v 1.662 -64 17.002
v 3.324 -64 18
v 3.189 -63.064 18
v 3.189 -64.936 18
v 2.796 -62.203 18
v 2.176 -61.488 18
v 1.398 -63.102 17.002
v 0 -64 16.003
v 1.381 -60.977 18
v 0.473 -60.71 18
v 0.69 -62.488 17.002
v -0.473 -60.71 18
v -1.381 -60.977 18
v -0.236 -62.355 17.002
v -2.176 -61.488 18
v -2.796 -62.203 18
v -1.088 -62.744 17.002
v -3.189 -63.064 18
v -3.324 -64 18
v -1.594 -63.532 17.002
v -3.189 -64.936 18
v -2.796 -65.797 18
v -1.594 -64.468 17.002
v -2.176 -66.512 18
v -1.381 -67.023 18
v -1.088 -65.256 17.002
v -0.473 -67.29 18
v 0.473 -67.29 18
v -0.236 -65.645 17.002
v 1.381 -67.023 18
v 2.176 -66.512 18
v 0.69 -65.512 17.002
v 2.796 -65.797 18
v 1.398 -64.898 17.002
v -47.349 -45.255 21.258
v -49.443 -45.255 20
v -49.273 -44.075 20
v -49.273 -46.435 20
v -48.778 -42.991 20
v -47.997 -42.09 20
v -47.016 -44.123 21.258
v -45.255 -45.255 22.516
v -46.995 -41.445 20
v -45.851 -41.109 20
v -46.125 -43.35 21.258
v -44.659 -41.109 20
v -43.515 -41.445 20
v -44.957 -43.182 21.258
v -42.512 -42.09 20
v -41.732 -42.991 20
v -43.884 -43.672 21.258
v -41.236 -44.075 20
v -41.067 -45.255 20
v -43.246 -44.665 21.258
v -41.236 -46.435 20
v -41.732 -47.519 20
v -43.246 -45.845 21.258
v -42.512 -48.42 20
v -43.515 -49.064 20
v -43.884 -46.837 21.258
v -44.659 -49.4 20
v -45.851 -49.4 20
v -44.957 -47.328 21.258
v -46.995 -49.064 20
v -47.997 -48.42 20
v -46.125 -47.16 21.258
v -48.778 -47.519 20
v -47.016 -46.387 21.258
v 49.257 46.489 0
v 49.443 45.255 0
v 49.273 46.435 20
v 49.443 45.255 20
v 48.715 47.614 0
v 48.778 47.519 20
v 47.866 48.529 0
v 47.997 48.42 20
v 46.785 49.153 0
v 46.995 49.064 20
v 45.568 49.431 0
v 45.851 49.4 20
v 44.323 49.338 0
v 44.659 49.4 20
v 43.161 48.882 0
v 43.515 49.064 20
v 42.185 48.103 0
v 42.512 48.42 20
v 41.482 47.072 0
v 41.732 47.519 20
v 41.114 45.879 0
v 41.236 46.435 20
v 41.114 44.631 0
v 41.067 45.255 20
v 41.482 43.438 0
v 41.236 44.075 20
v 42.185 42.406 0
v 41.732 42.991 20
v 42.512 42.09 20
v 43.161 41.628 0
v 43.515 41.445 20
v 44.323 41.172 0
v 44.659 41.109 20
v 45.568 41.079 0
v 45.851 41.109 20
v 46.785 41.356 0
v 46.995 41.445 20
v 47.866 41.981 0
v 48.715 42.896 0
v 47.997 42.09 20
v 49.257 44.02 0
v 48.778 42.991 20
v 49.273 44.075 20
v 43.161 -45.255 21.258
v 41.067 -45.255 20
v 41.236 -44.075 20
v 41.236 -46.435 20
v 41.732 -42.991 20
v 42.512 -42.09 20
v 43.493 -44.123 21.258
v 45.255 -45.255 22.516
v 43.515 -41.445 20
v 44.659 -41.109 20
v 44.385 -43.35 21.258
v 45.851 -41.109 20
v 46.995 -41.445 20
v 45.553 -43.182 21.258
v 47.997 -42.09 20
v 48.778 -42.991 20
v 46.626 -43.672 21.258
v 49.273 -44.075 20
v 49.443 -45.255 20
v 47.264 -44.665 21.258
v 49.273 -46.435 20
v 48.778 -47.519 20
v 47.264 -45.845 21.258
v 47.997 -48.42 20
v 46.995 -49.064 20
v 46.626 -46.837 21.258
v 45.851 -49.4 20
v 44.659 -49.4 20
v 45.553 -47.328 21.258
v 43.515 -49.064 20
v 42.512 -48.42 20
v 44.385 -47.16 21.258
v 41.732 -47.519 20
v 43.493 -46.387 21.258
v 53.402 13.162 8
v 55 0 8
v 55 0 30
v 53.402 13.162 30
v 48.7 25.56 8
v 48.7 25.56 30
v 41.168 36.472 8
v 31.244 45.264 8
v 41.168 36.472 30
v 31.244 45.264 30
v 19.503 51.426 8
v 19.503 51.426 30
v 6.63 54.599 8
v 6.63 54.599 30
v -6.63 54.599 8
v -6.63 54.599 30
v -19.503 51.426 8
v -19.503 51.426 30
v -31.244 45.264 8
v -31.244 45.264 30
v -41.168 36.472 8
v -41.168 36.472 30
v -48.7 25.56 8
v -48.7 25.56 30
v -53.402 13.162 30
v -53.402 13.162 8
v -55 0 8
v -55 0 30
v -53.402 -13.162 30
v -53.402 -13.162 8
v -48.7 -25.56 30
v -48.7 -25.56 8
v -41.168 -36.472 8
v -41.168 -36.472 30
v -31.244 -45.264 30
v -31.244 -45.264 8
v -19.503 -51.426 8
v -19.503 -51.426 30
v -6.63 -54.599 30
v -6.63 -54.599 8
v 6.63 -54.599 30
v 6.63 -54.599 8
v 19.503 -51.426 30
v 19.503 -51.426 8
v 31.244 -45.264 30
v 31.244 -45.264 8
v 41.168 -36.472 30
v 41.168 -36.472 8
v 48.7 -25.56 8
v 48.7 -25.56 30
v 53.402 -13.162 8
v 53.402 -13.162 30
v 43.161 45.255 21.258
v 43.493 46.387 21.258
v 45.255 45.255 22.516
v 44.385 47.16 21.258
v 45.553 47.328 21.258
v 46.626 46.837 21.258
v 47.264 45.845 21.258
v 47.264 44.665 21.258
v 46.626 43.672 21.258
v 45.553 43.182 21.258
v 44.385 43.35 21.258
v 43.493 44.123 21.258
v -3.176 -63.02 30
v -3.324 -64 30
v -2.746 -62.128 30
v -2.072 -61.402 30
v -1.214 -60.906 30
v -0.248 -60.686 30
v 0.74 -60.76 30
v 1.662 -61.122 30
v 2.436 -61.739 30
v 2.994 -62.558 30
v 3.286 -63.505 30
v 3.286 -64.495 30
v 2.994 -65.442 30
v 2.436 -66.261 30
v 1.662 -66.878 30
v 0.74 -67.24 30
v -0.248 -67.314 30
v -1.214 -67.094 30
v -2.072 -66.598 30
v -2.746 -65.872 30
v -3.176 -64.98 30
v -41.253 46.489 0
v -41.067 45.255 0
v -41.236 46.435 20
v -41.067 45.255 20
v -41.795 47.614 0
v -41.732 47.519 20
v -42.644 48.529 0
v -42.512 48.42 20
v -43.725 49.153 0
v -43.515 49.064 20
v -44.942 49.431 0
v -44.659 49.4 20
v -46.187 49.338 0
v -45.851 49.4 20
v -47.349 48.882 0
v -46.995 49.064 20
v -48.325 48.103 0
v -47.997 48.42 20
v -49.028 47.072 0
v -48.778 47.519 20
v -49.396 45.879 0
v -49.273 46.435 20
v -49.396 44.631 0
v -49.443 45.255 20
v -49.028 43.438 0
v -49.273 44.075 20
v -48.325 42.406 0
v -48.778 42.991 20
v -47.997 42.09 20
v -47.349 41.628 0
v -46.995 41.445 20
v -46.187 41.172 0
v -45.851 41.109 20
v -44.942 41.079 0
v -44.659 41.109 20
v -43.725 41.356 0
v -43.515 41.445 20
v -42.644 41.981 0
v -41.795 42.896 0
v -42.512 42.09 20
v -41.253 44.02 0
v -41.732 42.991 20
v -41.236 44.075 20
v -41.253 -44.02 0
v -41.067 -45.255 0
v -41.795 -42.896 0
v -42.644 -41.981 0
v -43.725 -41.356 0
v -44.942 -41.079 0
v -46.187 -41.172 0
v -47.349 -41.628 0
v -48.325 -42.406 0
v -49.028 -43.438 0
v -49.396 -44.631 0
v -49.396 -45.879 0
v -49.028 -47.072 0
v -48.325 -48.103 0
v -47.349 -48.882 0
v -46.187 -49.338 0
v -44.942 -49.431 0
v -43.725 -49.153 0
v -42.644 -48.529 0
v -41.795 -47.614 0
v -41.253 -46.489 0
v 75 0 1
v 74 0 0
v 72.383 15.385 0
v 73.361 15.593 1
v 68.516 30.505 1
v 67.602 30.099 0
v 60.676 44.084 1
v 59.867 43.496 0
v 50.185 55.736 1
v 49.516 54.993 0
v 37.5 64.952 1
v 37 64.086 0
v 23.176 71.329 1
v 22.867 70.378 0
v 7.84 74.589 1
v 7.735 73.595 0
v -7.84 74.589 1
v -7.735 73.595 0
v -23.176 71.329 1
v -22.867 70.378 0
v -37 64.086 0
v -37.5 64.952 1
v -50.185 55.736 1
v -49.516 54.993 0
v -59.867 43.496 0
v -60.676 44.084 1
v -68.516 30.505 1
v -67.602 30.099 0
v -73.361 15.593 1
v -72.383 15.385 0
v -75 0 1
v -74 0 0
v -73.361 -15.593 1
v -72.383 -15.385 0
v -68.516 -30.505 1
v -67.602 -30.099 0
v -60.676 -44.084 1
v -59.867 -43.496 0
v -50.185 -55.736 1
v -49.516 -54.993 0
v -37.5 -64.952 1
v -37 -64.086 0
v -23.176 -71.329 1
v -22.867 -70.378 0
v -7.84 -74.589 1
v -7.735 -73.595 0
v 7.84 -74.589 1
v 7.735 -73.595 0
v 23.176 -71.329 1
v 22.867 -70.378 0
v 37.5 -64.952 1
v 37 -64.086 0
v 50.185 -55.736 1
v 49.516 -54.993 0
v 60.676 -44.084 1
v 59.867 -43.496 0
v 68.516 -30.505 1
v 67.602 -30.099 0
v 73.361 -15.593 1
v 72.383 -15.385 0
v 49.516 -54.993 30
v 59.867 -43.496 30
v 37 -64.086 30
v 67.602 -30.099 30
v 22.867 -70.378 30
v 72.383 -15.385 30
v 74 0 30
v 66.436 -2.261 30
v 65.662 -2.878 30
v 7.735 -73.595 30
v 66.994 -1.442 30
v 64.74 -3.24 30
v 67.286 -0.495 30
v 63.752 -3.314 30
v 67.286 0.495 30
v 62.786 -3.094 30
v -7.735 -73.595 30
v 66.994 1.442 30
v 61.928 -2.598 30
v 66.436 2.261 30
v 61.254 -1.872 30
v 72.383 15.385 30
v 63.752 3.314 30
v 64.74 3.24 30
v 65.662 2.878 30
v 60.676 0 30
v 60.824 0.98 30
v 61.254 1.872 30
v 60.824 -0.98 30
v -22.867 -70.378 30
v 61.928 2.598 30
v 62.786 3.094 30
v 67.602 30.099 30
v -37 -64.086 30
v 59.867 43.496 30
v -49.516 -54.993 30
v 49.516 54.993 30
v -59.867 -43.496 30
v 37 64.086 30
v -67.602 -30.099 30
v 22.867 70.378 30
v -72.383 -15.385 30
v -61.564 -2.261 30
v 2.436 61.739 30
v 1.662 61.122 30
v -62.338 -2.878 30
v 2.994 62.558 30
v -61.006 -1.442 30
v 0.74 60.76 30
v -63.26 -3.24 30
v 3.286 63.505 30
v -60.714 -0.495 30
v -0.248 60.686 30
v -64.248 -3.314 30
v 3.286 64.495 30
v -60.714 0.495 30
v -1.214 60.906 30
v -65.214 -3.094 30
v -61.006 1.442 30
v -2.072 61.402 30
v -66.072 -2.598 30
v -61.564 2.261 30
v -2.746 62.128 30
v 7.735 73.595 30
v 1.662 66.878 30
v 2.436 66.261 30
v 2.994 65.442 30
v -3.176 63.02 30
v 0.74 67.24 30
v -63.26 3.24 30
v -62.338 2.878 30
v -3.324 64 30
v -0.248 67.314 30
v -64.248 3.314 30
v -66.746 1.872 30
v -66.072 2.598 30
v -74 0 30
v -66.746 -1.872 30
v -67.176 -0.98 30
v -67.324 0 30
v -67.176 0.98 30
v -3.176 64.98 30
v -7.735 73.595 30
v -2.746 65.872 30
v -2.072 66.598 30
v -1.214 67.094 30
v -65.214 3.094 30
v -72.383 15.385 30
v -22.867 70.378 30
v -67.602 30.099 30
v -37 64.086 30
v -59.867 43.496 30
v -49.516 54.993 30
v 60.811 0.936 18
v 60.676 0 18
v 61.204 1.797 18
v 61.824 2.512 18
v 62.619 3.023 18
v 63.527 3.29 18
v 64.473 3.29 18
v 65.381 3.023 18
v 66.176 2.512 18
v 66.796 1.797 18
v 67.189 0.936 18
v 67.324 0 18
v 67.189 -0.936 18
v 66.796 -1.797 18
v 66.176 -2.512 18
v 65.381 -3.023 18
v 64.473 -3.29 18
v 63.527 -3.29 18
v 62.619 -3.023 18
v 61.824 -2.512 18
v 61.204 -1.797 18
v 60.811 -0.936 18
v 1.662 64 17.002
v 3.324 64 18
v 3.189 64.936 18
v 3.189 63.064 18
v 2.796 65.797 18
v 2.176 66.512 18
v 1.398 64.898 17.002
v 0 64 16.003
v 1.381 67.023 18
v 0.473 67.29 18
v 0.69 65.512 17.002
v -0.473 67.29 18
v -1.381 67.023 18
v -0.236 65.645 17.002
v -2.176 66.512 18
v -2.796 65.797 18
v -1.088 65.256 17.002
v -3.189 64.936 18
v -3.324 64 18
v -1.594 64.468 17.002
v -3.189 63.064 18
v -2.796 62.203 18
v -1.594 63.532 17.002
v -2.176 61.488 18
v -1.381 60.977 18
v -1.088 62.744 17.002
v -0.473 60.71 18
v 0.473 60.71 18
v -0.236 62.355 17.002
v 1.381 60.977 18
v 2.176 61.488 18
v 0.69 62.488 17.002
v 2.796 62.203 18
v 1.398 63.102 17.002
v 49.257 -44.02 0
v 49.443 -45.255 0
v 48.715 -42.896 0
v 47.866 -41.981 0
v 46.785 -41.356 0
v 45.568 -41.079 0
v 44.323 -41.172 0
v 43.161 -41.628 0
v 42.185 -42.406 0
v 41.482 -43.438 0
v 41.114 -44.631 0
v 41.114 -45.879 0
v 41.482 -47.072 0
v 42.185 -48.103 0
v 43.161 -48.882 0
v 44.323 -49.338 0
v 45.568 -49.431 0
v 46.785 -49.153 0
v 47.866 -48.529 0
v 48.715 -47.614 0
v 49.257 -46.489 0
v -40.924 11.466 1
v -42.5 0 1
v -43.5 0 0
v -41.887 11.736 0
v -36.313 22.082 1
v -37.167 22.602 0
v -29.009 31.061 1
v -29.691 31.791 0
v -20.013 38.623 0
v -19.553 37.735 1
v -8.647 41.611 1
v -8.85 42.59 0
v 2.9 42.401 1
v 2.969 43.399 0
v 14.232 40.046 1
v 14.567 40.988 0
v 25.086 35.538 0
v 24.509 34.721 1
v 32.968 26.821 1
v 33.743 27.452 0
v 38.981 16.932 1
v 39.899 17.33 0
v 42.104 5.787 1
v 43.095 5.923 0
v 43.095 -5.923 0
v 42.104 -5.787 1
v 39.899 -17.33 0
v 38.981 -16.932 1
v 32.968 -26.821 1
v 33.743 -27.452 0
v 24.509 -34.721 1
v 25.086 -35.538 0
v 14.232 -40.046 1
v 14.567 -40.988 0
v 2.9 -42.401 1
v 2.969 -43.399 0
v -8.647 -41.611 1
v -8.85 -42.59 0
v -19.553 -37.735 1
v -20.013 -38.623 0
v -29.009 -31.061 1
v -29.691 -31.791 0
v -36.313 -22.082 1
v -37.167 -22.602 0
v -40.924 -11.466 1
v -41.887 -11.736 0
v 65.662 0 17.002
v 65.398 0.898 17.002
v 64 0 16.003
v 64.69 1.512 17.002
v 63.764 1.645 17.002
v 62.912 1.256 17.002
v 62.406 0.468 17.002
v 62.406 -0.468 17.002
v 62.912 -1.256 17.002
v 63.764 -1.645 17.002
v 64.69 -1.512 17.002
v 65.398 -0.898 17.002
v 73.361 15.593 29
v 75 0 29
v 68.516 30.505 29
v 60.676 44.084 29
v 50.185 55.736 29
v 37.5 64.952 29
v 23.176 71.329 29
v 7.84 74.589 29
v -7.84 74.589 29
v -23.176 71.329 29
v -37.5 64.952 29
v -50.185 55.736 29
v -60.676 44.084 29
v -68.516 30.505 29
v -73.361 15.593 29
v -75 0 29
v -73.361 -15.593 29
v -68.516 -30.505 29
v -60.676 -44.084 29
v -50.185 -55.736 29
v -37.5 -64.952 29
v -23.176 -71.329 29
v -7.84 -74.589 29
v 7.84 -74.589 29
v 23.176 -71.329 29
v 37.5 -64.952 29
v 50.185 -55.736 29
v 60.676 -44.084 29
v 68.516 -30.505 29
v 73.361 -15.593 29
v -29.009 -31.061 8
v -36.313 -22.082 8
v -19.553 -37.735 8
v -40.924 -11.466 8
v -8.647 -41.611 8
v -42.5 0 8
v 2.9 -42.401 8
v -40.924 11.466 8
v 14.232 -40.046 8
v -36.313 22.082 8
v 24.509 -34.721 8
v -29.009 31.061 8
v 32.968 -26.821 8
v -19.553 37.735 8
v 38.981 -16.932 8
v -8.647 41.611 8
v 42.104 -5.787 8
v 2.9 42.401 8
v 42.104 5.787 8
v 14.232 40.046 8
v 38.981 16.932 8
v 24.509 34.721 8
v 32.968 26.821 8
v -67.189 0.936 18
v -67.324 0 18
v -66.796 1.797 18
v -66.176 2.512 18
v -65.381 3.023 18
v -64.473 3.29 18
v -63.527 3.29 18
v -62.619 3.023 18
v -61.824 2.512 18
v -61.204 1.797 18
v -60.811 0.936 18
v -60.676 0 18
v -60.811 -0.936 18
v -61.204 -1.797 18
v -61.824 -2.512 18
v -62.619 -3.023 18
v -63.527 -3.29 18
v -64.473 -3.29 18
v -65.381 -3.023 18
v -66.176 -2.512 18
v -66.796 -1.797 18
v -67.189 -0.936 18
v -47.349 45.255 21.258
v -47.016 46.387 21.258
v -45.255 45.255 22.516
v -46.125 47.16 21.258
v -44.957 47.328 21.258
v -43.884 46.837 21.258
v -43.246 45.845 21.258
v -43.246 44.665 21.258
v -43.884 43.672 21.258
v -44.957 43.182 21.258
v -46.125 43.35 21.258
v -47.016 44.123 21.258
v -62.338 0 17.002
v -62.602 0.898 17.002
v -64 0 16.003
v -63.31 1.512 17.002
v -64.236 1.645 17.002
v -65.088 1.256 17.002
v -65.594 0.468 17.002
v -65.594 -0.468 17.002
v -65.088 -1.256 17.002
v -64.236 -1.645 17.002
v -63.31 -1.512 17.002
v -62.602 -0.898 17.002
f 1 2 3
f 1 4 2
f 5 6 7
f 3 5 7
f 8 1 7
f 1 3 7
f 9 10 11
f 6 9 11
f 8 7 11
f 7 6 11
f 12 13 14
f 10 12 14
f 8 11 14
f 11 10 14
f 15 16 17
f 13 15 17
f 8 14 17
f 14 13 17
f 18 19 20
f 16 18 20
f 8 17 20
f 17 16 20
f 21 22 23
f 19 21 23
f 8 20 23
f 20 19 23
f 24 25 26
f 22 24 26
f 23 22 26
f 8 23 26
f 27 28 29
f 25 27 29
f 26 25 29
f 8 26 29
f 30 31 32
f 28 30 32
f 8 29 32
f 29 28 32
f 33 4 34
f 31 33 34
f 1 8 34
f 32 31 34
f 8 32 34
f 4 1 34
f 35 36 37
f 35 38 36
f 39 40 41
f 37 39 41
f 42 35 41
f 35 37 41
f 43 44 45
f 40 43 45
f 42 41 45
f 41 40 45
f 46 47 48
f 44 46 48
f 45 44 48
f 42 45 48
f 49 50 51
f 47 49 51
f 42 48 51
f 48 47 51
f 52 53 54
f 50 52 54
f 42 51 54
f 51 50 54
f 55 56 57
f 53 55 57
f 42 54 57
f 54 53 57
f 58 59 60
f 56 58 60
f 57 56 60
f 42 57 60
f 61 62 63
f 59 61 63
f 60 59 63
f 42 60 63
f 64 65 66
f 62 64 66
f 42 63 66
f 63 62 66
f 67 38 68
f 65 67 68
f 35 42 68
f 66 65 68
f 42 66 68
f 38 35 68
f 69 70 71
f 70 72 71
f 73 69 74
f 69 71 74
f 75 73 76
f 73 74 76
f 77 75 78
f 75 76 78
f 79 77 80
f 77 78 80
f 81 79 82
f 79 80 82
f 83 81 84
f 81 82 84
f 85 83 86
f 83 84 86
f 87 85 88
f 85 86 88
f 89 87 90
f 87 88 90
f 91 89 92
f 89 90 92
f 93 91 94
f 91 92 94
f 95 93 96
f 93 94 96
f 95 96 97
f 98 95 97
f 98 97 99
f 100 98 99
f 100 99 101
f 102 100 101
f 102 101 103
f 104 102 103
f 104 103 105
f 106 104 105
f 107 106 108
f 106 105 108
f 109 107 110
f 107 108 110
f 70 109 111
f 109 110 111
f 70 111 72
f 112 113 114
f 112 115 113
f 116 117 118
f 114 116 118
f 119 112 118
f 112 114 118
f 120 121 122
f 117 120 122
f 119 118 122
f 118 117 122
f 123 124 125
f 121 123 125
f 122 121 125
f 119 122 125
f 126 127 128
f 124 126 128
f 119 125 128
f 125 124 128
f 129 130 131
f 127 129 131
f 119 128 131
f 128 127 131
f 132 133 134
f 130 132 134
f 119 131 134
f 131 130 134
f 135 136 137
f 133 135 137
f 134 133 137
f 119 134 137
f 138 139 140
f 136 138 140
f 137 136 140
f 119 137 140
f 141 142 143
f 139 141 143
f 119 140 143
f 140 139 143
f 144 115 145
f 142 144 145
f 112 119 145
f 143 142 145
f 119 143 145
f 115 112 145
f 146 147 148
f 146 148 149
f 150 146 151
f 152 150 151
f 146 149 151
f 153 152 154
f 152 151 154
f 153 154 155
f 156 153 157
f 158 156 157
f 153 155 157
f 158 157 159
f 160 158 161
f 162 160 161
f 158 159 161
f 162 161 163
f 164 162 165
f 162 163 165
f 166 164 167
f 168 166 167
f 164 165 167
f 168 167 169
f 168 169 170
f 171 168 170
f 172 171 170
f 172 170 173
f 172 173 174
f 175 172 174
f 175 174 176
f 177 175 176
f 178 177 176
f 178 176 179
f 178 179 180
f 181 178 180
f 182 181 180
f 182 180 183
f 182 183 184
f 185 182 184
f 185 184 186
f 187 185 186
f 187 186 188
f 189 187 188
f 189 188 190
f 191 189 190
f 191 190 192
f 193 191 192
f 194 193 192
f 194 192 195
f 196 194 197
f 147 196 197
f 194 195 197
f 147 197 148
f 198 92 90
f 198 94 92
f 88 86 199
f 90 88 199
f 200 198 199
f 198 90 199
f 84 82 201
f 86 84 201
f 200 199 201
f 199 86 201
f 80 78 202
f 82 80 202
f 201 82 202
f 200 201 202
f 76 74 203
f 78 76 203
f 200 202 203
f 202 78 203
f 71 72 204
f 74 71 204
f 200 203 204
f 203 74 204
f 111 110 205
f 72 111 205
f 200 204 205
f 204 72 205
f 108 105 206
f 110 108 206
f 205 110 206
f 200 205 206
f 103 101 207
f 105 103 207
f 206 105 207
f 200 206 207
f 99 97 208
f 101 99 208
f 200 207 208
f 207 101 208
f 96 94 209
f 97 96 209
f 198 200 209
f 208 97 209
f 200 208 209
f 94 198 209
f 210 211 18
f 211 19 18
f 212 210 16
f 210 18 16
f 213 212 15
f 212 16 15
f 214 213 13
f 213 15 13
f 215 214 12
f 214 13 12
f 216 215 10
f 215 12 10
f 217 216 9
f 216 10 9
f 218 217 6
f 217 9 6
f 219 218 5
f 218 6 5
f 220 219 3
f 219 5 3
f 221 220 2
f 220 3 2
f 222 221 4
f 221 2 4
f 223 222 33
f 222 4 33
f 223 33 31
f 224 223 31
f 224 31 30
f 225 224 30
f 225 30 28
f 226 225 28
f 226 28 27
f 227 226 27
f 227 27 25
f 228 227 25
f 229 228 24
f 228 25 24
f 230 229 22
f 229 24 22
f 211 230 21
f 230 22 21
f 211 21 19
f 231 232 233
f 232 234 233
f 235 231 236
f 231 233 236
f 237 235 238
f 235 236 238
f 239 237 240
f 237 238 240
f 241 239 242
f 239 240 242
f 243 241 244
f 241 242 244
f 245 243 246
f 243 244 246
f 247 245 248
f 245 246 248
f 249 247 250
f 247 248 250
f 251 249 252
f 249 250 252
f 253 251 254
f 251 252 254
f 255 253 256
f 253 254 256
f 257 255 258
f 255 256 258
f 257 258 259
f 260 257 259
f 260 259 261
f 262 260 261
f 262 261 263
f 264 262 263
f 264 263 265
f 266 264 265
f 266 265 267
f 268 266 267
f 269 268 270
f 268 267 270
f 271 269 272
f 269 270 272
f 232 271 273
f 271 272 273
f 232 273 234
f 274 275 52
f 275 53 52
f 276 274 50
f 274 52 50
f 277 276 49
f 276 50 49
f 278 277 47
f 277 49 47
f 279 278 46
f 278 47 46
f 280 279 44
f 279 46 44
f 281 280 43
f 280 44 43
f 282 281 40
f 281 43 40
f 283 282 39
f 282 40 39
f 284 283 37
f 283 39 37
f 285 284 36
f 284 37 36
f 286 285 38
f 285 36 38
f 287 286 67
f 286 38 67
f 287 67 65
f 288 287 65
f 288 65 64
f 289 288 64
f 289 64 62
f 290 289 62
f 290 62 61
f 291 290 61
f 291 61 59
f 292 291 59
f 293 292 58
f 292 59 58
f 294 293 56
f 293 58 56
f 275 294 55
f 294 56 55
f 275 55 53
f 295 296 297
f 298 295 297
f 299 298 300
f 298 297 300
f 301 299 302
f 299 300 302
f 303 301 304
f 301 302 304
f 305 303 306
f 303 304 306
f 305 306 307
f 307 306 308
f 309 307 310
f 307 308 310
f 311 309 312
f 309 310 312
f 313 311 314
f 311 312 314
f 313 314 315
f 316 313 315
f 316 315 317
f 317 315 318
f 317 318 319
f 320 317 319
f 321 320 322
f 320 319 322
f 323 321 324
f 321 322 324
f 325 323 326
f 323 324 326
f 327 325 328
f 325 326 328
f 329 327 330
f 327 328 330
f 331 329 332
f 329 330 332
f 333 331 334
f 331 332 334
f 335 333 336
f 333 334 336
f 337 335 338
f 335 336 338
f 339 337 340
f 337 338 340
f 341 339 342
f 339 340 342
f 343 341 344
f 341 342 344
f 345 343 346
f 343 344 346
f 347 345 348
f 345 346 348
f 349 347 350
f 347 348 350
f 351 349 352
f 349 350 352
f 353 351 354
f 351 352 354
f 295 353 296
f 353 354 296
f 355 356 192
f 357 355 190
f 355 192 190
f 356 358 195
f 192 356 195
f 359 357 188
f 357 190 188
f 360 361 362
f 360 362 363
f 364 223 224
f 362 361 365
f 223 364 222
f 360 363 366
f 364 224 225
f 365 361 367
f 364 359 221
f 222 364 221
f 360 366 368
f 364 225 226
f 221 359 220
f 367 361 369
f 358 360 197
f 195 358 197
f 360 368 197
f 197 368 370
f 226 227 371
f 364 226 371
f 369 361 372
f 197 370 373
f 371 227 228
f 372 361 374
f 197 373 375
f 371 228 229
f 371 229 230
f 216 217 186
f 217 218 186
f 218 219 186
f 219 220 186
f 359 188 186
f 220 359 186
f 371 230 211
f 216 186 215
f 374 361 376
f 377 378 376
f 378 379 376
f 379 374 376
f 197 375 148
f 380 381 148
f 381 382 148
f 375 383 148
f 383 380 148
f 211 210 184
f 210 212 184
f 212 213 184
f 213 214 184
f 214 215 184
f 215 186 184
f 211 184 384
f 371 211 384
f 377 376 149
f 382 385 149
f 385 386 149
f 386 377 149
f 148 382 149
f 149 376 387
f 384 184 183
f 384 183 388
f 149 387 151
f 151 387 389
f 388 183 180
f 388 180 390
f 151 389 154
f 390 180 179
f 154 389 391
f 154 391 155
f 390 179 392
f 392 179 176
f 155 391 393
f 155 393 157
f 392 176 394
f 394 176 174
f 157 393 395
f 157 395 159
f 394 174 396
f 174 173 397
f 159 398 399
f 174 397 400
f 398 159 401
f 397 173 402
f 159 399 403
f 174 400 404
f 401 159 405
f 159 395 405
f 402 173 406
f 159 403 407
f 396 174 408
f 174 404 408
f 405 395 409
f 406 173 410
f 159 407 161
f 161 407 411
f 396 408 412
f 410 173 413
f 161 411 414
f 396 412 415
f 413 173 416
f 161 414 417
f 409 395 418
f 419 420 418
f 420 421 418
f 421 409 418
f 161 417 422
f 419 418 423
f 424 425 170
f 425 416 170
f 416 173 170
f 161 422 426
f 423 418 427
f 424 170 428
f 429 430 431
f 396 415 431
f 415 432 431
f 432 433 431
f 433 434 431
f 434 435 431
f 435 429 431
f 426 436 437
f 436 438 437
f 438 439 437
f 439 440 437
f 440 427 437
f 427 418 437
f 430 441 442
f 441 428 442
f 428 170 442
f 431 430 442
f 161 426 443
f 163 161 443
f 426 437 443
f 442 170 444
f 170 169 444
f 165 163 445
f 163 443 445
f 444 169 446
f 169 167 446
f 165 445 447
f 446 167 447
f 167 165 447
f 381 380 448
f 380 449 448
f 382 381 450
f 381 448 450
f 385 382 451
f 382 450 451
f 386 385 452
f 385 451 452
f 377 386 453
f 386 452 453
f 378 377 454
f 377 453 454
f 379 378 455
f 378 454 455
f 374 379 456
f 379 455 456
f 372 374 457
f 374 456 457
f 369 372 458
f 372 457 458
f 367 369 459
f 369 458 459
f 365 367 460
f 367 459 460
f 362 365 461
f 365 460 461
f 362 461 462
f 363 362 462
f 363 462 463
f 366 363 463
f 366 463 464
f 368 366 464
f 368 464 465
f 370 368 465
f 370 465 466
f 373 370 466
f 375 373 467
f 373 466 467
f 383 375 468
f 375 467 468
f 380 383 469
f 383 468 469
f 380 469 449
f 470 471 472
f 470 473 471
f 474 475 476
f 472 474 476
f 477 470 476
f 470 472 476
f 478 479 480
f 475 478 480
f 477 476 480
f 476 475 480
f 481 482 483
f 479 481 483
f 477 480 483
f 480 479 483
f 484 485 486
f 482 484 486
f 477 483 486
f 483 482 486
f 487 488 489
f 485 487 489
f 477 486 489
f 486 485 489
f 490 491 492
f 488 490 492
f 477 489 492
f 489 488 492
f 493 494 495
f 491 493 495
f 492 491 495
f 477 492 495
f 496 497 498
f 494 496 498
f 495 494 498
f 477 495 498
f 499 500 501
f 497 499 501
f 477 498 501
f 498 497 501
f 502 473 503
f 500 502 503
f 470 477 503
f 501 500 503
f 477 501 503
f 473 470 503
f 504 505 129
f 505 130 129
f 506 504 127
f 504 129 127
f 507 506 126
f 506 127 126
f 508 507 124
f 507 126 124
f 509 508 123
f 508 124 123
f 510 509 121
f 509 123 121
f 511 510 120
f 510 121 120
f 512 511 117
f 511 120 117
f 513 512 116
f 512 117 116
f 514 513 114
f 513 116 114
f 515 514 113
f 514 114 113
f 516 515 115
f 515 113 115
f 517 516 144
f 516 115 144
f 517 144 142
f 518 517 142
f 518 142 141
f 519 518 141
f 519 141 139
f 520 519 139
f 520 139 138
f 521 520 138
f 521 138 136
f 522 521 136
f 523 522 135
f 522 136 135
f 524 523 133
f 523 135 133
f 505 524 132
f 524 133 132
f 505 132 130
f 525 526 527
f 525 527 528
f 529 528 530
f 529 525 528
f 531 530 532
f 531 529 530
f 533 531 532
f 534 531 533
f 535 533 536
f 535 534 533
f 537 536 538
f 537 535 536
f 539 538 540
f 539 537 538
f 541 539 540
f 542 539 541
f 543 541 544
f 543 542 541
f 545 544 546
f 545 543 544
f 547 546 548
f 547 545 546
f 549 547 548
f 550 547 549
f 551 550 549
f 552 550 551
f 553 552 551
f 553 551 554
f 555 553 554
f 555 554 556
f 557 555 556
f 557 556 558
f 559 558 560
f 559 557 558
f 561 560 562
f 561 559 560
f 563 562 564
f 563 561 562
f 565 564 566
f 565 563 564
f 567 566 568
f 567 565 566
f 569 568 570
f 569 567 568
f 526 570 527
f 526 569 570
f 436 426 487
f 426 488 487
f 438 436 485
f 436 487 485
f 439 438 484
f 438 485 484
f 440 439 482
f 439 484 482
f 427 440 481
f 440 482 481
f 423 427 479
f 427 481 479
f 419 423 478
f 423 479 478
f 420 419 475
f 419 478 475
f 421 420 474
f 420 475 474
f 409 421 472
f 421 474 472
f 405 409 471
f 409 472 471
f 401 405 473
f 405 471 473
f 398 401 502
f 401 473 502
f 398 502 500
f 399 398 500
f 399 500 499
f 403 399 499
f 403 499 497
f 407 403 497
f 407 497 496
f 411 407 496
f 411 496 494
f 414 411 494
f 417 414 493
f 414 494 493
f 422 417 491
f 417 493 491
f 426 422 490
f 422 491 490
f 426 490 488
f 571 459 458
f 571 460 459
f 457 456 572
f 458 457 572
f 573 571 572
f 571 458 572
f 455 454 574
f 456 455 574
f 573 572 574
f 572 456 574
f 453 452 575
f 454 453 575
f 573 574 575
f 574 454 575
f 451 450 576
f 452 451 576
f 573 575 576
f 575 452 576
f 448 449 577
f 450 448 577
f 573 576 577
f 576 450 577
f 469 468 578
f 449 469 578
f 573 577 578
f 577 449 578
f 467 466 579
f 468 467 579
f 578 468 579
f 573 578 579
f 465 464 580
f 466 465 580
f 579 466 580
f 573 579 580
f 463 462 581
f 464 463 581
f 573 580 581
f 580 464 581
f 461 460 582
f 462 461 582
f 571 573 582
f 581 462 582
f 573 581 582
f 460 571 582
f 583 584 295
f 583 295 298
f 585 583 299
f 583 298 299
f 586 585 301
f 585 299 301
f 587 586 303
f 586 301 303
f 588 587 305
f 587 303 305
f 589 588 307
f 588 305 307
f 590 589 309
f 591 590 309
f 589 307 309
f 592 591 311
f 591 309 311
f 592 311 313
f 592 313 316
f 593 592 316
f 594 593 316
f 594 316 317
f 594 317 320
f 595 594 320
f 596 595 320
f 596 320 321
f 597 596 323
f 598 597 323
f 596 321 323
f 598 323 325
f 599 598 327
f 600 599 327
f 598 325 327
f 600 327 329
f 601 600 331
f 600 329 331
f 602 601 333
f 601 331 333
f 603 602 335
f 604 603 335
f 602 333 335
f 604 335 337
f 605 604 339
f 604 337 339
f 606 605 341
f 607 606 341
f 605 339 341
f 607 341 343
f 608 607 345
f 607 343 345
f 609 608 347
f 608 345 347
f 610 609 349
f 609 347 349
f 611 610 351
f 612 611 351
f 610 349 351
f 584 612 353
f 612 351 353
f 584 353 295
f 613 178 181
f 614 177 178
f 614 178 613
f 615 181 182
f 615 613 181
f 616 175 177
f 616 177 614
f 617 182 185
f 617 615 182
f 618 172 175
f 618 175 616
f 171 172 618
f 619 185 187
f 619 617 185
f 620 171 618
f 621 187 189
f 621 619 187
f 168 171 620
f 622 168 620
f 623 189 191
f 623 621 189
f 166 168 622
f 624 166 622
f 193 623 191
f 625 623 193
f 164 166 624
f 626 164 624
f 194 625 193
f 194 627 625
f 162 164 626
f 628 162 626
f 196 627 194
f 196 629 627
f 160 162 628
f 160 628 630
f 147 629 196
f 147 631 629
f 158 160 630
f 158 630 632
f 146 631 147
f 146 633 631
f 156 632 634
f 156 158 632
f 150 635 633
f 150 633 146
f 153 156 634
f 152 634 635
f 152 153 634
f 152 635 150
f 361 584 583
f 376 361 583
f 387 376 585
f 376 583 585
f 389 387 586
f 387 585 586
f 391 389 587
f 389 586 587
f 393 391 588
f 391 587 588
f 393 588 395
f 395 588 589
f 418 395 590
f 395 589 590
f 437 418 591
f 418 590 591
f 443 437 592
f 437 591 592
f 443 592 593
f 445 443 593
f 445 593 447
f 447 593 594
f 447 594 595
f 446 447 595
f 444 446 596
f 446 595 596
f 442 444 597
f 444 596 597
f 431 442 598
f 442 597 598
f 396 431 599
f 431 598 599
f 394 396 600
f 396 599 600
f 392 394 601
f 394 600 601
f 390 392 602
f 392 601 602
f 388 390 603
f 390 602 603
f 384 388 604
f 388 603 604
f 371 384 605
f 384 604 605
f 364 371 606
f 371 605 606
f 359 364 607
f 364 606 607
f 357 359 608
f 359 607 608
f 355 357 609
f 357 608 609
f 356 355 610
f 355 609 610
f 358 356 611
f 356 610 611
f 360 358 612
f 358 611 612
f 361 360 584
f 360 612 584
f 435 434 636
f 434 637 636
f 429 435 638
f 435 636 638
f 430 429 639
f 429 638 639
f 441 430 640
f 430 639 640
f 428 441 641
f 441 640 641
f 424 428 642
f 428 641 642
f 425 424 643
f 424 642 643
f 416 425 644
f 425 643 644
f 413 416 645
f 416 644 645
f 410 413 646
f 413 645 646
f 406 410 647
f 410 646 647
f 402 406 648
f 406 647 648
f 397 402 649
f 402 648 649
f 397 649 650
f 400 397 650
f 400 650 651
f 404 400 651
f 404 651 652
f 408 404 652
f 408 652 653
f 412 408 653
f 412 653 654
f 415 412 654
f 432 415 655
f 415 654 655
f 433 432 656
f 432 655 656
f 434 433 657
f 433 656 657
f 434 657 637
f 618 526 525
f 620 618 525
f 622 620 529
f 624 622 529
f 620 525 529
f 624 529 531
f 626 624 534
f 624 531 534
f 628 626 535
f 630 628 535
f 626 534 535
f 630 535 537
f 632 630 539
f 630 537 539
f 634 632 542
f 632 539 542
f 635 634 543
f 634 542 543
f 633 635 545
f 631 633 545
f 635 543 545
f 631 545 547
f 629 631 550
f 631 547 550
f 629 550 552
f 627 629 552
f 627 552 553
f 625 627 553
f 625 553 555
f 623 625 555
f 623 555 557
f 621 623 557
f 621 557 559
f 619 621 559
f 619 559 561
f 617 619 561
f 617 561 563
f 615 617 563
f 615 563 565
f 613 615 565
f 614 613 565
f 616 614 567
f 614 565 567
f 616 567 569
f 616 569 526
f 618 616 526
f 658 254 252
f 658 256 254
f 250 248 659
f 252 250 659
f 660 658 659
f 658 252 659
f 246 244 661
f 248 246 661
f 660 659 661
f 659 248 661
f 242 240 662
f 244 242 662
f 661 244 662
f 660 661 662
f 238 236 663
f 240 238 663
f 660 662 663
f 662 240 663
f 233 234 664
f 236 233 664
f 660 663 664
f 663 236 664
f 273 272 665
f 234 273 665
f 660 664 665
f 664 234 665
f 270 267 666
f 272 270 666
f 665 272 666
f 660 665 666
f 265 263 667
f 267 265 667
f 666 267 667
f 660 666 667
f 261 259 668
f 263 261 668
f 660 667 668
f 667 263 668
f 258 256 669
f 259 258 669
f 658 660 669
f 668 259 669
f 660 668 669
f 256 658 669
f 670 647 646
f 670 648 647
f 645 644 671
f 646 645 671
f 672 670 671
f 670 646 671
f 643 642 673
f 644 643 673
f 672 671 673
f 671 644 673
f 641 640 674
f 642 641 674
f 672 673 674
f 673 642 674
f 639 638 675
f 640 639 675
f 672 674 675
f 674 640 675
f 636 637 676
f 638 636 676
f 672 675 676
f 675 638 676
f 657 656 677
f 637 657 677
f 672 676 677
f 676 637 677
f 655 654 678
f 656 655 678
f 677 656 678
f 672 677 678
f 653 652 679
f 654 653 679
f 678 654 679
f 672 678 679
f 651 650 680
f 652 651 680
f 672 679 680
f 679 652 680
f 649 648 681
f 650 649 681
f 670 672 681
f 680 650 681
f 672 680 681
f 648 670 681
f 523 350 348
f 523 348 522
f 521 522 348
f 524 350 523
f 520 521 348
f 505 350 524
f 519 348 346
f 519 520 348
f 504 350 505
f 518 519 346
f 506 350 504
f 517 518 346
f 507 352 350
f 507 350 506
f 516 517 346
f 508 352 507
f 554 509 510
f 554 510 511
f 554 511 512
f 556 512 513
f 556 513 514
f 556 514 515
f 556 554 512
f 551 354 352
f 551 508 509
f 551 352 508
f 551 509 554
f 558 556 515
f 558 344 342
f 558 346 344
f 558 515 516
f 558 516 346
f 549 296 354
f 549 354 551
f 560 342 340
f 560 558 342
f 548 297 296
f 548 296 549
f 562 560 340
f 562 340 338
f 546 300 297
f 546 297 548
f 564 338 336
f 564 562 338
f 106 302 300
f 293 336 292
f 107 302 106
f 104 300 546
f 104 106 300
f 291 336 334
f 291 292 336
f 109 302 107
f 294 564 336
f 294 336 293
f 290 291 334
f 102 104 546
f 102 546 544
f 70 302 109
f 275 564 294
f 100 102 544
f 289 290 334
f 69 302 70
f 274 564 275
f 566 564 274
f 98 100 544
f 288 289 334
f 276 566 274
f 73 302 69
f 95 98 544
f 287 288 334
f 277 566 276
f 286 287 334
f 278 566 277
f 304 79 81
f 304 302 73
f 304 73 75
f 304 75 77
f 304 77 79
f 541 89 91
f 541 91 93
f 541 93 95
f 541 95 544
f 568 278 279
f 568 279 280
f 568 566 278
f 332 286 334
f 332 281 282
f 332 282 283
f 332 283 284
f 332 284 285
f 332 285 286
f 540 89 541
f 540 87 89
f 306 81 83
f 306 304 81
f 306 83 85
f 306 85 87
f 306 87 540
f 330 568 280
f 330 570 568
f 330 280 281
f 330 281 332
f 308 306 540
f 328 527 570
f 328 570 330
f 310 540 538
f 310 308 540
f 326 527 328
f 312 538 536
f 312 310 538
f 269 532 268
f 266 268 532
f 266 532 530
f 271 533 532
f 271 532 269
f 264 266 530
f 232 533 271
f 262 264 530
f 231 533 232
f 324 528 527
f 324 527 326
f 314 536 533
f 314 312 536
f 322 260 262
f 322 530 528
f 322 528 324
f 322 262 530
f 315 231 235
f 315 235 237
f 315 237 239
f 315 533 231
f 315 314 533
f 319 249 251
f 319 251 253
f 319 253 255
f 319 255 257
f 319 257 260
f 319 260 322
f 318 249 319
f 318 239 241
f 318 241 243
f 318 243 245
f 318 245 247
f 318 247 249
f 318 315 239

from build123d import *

# Parameters (mm, degrees)
SKETCH1_W                                = 75
SKETCH1_H                                = 30
CBORE_FOR_M80_HEX_HEAD_BOLT1_D           = 85
CBORE_FOR_M80_HEX_HEAD_BOLT1_DEPTH       = 30
CBORE_FOR_M80_HEX_HEAD_BOLT1_CBORE_D     = 110
CBORE_FOR_M80_HEX_HEAD_BOLT1_CBORE_DEPTH = 22
HOLE1_D                                  = 8.376
HOLE1_DEPTH                              = 20
HOLE1_TIP                                = 2.516404272
M6_CLEARANCE_HOLE1_D                     = 6.647
M6_CLEARANCE_HOLE1_DEPTH                 = 12
M6_CLEARANCE_HOLE1_TIP                   = 1.996960267
CHAMFER1_SIZE                            = 1


with BuildPart() as part:
    # Sketch1 → Revolve1 (revolve)
    with BuildSketch(Plane(origin=(0, 0, 0), x_dir=(1, 0, 0), z_dir=(0, 1, 0))):
        with Locations((37.5, -15)):
            Rectangle(SKETCH1_W, SKETCH1_H)
    revolve(axis=Axis((0, 0, 0), (0, 0, 1)))

    # CBORE for M80 Hex Head Bolt1
    with Locations(Plane.XY.offset(30)):
        with Locations((0, 0)):
            CounterBoreHole(CBORE_FOR_M80_HEX_HEAD_BOLT1_D / 2, CBORE_FOR_M80_HEX_HEAD_BOLT1_CBORE_D / 2, CBORE_FOR_M80_HEX_HEAD_BOLT1_CBORE_DEPTH, depth=CBORE_FOR_M80_HEX_HEAD_BOLT1_DEPTH)

    # Hole1
    with Locations(Plane(origin=(0, 0, 0), x_dir=(-1, 0, 0), z_dir=(0, 0, -1))):
        with Locations((45.254833996, 45.254833996), (-45.254833996, 45.254833996), (-45.254833996, -45.254833996), (45.254833996, -45.254833996)):
            Hole(HOLE1_D / 2, depth=HOLE1_DEPTH)
            with Locations((0, 0, -(HOLE1_DEPTH + HOLE1_TIP / 2))):  # 118° drill point
                Cone(0, HOLE1_D / 2, HOLE1_TIP, mode=Mode.SUBTRACT)

    # M6 Clearance Hole1
    with Locations(Plane.XY.offset(30)):
        with Locations((0, 64), (0, -64), (64, 0), (-64, 0)):
            Hole(M6_CLEARANCE_HOLE1_D / 2, depth=M6_CLEARANCE_HOLE1_DEPTH)
            with Locations((0, 0, -(M6_CLEARANCE_HOLE1_DEPTH + M6_CLEARANCE_HOLE1_TIP / 2))):  # 118° drill point
                Cone(0, M6_CLEARANCE_HOLE1_D / 2, M6_CLEARANCE_HOLE1_TIP, mode=Mode.SUBTRACT)

    # Chamfer1
    chamfer1_edges = [part.edges().sort_by_distance(p)[0] for p in [
        (42.5, 0, 0),
        (-75, 0, 30),
        (-75, 0, 0),
    ]]
    chamfer(chamfer1_edges, length=CHAMFER1_SIZE)


solid = part.part
